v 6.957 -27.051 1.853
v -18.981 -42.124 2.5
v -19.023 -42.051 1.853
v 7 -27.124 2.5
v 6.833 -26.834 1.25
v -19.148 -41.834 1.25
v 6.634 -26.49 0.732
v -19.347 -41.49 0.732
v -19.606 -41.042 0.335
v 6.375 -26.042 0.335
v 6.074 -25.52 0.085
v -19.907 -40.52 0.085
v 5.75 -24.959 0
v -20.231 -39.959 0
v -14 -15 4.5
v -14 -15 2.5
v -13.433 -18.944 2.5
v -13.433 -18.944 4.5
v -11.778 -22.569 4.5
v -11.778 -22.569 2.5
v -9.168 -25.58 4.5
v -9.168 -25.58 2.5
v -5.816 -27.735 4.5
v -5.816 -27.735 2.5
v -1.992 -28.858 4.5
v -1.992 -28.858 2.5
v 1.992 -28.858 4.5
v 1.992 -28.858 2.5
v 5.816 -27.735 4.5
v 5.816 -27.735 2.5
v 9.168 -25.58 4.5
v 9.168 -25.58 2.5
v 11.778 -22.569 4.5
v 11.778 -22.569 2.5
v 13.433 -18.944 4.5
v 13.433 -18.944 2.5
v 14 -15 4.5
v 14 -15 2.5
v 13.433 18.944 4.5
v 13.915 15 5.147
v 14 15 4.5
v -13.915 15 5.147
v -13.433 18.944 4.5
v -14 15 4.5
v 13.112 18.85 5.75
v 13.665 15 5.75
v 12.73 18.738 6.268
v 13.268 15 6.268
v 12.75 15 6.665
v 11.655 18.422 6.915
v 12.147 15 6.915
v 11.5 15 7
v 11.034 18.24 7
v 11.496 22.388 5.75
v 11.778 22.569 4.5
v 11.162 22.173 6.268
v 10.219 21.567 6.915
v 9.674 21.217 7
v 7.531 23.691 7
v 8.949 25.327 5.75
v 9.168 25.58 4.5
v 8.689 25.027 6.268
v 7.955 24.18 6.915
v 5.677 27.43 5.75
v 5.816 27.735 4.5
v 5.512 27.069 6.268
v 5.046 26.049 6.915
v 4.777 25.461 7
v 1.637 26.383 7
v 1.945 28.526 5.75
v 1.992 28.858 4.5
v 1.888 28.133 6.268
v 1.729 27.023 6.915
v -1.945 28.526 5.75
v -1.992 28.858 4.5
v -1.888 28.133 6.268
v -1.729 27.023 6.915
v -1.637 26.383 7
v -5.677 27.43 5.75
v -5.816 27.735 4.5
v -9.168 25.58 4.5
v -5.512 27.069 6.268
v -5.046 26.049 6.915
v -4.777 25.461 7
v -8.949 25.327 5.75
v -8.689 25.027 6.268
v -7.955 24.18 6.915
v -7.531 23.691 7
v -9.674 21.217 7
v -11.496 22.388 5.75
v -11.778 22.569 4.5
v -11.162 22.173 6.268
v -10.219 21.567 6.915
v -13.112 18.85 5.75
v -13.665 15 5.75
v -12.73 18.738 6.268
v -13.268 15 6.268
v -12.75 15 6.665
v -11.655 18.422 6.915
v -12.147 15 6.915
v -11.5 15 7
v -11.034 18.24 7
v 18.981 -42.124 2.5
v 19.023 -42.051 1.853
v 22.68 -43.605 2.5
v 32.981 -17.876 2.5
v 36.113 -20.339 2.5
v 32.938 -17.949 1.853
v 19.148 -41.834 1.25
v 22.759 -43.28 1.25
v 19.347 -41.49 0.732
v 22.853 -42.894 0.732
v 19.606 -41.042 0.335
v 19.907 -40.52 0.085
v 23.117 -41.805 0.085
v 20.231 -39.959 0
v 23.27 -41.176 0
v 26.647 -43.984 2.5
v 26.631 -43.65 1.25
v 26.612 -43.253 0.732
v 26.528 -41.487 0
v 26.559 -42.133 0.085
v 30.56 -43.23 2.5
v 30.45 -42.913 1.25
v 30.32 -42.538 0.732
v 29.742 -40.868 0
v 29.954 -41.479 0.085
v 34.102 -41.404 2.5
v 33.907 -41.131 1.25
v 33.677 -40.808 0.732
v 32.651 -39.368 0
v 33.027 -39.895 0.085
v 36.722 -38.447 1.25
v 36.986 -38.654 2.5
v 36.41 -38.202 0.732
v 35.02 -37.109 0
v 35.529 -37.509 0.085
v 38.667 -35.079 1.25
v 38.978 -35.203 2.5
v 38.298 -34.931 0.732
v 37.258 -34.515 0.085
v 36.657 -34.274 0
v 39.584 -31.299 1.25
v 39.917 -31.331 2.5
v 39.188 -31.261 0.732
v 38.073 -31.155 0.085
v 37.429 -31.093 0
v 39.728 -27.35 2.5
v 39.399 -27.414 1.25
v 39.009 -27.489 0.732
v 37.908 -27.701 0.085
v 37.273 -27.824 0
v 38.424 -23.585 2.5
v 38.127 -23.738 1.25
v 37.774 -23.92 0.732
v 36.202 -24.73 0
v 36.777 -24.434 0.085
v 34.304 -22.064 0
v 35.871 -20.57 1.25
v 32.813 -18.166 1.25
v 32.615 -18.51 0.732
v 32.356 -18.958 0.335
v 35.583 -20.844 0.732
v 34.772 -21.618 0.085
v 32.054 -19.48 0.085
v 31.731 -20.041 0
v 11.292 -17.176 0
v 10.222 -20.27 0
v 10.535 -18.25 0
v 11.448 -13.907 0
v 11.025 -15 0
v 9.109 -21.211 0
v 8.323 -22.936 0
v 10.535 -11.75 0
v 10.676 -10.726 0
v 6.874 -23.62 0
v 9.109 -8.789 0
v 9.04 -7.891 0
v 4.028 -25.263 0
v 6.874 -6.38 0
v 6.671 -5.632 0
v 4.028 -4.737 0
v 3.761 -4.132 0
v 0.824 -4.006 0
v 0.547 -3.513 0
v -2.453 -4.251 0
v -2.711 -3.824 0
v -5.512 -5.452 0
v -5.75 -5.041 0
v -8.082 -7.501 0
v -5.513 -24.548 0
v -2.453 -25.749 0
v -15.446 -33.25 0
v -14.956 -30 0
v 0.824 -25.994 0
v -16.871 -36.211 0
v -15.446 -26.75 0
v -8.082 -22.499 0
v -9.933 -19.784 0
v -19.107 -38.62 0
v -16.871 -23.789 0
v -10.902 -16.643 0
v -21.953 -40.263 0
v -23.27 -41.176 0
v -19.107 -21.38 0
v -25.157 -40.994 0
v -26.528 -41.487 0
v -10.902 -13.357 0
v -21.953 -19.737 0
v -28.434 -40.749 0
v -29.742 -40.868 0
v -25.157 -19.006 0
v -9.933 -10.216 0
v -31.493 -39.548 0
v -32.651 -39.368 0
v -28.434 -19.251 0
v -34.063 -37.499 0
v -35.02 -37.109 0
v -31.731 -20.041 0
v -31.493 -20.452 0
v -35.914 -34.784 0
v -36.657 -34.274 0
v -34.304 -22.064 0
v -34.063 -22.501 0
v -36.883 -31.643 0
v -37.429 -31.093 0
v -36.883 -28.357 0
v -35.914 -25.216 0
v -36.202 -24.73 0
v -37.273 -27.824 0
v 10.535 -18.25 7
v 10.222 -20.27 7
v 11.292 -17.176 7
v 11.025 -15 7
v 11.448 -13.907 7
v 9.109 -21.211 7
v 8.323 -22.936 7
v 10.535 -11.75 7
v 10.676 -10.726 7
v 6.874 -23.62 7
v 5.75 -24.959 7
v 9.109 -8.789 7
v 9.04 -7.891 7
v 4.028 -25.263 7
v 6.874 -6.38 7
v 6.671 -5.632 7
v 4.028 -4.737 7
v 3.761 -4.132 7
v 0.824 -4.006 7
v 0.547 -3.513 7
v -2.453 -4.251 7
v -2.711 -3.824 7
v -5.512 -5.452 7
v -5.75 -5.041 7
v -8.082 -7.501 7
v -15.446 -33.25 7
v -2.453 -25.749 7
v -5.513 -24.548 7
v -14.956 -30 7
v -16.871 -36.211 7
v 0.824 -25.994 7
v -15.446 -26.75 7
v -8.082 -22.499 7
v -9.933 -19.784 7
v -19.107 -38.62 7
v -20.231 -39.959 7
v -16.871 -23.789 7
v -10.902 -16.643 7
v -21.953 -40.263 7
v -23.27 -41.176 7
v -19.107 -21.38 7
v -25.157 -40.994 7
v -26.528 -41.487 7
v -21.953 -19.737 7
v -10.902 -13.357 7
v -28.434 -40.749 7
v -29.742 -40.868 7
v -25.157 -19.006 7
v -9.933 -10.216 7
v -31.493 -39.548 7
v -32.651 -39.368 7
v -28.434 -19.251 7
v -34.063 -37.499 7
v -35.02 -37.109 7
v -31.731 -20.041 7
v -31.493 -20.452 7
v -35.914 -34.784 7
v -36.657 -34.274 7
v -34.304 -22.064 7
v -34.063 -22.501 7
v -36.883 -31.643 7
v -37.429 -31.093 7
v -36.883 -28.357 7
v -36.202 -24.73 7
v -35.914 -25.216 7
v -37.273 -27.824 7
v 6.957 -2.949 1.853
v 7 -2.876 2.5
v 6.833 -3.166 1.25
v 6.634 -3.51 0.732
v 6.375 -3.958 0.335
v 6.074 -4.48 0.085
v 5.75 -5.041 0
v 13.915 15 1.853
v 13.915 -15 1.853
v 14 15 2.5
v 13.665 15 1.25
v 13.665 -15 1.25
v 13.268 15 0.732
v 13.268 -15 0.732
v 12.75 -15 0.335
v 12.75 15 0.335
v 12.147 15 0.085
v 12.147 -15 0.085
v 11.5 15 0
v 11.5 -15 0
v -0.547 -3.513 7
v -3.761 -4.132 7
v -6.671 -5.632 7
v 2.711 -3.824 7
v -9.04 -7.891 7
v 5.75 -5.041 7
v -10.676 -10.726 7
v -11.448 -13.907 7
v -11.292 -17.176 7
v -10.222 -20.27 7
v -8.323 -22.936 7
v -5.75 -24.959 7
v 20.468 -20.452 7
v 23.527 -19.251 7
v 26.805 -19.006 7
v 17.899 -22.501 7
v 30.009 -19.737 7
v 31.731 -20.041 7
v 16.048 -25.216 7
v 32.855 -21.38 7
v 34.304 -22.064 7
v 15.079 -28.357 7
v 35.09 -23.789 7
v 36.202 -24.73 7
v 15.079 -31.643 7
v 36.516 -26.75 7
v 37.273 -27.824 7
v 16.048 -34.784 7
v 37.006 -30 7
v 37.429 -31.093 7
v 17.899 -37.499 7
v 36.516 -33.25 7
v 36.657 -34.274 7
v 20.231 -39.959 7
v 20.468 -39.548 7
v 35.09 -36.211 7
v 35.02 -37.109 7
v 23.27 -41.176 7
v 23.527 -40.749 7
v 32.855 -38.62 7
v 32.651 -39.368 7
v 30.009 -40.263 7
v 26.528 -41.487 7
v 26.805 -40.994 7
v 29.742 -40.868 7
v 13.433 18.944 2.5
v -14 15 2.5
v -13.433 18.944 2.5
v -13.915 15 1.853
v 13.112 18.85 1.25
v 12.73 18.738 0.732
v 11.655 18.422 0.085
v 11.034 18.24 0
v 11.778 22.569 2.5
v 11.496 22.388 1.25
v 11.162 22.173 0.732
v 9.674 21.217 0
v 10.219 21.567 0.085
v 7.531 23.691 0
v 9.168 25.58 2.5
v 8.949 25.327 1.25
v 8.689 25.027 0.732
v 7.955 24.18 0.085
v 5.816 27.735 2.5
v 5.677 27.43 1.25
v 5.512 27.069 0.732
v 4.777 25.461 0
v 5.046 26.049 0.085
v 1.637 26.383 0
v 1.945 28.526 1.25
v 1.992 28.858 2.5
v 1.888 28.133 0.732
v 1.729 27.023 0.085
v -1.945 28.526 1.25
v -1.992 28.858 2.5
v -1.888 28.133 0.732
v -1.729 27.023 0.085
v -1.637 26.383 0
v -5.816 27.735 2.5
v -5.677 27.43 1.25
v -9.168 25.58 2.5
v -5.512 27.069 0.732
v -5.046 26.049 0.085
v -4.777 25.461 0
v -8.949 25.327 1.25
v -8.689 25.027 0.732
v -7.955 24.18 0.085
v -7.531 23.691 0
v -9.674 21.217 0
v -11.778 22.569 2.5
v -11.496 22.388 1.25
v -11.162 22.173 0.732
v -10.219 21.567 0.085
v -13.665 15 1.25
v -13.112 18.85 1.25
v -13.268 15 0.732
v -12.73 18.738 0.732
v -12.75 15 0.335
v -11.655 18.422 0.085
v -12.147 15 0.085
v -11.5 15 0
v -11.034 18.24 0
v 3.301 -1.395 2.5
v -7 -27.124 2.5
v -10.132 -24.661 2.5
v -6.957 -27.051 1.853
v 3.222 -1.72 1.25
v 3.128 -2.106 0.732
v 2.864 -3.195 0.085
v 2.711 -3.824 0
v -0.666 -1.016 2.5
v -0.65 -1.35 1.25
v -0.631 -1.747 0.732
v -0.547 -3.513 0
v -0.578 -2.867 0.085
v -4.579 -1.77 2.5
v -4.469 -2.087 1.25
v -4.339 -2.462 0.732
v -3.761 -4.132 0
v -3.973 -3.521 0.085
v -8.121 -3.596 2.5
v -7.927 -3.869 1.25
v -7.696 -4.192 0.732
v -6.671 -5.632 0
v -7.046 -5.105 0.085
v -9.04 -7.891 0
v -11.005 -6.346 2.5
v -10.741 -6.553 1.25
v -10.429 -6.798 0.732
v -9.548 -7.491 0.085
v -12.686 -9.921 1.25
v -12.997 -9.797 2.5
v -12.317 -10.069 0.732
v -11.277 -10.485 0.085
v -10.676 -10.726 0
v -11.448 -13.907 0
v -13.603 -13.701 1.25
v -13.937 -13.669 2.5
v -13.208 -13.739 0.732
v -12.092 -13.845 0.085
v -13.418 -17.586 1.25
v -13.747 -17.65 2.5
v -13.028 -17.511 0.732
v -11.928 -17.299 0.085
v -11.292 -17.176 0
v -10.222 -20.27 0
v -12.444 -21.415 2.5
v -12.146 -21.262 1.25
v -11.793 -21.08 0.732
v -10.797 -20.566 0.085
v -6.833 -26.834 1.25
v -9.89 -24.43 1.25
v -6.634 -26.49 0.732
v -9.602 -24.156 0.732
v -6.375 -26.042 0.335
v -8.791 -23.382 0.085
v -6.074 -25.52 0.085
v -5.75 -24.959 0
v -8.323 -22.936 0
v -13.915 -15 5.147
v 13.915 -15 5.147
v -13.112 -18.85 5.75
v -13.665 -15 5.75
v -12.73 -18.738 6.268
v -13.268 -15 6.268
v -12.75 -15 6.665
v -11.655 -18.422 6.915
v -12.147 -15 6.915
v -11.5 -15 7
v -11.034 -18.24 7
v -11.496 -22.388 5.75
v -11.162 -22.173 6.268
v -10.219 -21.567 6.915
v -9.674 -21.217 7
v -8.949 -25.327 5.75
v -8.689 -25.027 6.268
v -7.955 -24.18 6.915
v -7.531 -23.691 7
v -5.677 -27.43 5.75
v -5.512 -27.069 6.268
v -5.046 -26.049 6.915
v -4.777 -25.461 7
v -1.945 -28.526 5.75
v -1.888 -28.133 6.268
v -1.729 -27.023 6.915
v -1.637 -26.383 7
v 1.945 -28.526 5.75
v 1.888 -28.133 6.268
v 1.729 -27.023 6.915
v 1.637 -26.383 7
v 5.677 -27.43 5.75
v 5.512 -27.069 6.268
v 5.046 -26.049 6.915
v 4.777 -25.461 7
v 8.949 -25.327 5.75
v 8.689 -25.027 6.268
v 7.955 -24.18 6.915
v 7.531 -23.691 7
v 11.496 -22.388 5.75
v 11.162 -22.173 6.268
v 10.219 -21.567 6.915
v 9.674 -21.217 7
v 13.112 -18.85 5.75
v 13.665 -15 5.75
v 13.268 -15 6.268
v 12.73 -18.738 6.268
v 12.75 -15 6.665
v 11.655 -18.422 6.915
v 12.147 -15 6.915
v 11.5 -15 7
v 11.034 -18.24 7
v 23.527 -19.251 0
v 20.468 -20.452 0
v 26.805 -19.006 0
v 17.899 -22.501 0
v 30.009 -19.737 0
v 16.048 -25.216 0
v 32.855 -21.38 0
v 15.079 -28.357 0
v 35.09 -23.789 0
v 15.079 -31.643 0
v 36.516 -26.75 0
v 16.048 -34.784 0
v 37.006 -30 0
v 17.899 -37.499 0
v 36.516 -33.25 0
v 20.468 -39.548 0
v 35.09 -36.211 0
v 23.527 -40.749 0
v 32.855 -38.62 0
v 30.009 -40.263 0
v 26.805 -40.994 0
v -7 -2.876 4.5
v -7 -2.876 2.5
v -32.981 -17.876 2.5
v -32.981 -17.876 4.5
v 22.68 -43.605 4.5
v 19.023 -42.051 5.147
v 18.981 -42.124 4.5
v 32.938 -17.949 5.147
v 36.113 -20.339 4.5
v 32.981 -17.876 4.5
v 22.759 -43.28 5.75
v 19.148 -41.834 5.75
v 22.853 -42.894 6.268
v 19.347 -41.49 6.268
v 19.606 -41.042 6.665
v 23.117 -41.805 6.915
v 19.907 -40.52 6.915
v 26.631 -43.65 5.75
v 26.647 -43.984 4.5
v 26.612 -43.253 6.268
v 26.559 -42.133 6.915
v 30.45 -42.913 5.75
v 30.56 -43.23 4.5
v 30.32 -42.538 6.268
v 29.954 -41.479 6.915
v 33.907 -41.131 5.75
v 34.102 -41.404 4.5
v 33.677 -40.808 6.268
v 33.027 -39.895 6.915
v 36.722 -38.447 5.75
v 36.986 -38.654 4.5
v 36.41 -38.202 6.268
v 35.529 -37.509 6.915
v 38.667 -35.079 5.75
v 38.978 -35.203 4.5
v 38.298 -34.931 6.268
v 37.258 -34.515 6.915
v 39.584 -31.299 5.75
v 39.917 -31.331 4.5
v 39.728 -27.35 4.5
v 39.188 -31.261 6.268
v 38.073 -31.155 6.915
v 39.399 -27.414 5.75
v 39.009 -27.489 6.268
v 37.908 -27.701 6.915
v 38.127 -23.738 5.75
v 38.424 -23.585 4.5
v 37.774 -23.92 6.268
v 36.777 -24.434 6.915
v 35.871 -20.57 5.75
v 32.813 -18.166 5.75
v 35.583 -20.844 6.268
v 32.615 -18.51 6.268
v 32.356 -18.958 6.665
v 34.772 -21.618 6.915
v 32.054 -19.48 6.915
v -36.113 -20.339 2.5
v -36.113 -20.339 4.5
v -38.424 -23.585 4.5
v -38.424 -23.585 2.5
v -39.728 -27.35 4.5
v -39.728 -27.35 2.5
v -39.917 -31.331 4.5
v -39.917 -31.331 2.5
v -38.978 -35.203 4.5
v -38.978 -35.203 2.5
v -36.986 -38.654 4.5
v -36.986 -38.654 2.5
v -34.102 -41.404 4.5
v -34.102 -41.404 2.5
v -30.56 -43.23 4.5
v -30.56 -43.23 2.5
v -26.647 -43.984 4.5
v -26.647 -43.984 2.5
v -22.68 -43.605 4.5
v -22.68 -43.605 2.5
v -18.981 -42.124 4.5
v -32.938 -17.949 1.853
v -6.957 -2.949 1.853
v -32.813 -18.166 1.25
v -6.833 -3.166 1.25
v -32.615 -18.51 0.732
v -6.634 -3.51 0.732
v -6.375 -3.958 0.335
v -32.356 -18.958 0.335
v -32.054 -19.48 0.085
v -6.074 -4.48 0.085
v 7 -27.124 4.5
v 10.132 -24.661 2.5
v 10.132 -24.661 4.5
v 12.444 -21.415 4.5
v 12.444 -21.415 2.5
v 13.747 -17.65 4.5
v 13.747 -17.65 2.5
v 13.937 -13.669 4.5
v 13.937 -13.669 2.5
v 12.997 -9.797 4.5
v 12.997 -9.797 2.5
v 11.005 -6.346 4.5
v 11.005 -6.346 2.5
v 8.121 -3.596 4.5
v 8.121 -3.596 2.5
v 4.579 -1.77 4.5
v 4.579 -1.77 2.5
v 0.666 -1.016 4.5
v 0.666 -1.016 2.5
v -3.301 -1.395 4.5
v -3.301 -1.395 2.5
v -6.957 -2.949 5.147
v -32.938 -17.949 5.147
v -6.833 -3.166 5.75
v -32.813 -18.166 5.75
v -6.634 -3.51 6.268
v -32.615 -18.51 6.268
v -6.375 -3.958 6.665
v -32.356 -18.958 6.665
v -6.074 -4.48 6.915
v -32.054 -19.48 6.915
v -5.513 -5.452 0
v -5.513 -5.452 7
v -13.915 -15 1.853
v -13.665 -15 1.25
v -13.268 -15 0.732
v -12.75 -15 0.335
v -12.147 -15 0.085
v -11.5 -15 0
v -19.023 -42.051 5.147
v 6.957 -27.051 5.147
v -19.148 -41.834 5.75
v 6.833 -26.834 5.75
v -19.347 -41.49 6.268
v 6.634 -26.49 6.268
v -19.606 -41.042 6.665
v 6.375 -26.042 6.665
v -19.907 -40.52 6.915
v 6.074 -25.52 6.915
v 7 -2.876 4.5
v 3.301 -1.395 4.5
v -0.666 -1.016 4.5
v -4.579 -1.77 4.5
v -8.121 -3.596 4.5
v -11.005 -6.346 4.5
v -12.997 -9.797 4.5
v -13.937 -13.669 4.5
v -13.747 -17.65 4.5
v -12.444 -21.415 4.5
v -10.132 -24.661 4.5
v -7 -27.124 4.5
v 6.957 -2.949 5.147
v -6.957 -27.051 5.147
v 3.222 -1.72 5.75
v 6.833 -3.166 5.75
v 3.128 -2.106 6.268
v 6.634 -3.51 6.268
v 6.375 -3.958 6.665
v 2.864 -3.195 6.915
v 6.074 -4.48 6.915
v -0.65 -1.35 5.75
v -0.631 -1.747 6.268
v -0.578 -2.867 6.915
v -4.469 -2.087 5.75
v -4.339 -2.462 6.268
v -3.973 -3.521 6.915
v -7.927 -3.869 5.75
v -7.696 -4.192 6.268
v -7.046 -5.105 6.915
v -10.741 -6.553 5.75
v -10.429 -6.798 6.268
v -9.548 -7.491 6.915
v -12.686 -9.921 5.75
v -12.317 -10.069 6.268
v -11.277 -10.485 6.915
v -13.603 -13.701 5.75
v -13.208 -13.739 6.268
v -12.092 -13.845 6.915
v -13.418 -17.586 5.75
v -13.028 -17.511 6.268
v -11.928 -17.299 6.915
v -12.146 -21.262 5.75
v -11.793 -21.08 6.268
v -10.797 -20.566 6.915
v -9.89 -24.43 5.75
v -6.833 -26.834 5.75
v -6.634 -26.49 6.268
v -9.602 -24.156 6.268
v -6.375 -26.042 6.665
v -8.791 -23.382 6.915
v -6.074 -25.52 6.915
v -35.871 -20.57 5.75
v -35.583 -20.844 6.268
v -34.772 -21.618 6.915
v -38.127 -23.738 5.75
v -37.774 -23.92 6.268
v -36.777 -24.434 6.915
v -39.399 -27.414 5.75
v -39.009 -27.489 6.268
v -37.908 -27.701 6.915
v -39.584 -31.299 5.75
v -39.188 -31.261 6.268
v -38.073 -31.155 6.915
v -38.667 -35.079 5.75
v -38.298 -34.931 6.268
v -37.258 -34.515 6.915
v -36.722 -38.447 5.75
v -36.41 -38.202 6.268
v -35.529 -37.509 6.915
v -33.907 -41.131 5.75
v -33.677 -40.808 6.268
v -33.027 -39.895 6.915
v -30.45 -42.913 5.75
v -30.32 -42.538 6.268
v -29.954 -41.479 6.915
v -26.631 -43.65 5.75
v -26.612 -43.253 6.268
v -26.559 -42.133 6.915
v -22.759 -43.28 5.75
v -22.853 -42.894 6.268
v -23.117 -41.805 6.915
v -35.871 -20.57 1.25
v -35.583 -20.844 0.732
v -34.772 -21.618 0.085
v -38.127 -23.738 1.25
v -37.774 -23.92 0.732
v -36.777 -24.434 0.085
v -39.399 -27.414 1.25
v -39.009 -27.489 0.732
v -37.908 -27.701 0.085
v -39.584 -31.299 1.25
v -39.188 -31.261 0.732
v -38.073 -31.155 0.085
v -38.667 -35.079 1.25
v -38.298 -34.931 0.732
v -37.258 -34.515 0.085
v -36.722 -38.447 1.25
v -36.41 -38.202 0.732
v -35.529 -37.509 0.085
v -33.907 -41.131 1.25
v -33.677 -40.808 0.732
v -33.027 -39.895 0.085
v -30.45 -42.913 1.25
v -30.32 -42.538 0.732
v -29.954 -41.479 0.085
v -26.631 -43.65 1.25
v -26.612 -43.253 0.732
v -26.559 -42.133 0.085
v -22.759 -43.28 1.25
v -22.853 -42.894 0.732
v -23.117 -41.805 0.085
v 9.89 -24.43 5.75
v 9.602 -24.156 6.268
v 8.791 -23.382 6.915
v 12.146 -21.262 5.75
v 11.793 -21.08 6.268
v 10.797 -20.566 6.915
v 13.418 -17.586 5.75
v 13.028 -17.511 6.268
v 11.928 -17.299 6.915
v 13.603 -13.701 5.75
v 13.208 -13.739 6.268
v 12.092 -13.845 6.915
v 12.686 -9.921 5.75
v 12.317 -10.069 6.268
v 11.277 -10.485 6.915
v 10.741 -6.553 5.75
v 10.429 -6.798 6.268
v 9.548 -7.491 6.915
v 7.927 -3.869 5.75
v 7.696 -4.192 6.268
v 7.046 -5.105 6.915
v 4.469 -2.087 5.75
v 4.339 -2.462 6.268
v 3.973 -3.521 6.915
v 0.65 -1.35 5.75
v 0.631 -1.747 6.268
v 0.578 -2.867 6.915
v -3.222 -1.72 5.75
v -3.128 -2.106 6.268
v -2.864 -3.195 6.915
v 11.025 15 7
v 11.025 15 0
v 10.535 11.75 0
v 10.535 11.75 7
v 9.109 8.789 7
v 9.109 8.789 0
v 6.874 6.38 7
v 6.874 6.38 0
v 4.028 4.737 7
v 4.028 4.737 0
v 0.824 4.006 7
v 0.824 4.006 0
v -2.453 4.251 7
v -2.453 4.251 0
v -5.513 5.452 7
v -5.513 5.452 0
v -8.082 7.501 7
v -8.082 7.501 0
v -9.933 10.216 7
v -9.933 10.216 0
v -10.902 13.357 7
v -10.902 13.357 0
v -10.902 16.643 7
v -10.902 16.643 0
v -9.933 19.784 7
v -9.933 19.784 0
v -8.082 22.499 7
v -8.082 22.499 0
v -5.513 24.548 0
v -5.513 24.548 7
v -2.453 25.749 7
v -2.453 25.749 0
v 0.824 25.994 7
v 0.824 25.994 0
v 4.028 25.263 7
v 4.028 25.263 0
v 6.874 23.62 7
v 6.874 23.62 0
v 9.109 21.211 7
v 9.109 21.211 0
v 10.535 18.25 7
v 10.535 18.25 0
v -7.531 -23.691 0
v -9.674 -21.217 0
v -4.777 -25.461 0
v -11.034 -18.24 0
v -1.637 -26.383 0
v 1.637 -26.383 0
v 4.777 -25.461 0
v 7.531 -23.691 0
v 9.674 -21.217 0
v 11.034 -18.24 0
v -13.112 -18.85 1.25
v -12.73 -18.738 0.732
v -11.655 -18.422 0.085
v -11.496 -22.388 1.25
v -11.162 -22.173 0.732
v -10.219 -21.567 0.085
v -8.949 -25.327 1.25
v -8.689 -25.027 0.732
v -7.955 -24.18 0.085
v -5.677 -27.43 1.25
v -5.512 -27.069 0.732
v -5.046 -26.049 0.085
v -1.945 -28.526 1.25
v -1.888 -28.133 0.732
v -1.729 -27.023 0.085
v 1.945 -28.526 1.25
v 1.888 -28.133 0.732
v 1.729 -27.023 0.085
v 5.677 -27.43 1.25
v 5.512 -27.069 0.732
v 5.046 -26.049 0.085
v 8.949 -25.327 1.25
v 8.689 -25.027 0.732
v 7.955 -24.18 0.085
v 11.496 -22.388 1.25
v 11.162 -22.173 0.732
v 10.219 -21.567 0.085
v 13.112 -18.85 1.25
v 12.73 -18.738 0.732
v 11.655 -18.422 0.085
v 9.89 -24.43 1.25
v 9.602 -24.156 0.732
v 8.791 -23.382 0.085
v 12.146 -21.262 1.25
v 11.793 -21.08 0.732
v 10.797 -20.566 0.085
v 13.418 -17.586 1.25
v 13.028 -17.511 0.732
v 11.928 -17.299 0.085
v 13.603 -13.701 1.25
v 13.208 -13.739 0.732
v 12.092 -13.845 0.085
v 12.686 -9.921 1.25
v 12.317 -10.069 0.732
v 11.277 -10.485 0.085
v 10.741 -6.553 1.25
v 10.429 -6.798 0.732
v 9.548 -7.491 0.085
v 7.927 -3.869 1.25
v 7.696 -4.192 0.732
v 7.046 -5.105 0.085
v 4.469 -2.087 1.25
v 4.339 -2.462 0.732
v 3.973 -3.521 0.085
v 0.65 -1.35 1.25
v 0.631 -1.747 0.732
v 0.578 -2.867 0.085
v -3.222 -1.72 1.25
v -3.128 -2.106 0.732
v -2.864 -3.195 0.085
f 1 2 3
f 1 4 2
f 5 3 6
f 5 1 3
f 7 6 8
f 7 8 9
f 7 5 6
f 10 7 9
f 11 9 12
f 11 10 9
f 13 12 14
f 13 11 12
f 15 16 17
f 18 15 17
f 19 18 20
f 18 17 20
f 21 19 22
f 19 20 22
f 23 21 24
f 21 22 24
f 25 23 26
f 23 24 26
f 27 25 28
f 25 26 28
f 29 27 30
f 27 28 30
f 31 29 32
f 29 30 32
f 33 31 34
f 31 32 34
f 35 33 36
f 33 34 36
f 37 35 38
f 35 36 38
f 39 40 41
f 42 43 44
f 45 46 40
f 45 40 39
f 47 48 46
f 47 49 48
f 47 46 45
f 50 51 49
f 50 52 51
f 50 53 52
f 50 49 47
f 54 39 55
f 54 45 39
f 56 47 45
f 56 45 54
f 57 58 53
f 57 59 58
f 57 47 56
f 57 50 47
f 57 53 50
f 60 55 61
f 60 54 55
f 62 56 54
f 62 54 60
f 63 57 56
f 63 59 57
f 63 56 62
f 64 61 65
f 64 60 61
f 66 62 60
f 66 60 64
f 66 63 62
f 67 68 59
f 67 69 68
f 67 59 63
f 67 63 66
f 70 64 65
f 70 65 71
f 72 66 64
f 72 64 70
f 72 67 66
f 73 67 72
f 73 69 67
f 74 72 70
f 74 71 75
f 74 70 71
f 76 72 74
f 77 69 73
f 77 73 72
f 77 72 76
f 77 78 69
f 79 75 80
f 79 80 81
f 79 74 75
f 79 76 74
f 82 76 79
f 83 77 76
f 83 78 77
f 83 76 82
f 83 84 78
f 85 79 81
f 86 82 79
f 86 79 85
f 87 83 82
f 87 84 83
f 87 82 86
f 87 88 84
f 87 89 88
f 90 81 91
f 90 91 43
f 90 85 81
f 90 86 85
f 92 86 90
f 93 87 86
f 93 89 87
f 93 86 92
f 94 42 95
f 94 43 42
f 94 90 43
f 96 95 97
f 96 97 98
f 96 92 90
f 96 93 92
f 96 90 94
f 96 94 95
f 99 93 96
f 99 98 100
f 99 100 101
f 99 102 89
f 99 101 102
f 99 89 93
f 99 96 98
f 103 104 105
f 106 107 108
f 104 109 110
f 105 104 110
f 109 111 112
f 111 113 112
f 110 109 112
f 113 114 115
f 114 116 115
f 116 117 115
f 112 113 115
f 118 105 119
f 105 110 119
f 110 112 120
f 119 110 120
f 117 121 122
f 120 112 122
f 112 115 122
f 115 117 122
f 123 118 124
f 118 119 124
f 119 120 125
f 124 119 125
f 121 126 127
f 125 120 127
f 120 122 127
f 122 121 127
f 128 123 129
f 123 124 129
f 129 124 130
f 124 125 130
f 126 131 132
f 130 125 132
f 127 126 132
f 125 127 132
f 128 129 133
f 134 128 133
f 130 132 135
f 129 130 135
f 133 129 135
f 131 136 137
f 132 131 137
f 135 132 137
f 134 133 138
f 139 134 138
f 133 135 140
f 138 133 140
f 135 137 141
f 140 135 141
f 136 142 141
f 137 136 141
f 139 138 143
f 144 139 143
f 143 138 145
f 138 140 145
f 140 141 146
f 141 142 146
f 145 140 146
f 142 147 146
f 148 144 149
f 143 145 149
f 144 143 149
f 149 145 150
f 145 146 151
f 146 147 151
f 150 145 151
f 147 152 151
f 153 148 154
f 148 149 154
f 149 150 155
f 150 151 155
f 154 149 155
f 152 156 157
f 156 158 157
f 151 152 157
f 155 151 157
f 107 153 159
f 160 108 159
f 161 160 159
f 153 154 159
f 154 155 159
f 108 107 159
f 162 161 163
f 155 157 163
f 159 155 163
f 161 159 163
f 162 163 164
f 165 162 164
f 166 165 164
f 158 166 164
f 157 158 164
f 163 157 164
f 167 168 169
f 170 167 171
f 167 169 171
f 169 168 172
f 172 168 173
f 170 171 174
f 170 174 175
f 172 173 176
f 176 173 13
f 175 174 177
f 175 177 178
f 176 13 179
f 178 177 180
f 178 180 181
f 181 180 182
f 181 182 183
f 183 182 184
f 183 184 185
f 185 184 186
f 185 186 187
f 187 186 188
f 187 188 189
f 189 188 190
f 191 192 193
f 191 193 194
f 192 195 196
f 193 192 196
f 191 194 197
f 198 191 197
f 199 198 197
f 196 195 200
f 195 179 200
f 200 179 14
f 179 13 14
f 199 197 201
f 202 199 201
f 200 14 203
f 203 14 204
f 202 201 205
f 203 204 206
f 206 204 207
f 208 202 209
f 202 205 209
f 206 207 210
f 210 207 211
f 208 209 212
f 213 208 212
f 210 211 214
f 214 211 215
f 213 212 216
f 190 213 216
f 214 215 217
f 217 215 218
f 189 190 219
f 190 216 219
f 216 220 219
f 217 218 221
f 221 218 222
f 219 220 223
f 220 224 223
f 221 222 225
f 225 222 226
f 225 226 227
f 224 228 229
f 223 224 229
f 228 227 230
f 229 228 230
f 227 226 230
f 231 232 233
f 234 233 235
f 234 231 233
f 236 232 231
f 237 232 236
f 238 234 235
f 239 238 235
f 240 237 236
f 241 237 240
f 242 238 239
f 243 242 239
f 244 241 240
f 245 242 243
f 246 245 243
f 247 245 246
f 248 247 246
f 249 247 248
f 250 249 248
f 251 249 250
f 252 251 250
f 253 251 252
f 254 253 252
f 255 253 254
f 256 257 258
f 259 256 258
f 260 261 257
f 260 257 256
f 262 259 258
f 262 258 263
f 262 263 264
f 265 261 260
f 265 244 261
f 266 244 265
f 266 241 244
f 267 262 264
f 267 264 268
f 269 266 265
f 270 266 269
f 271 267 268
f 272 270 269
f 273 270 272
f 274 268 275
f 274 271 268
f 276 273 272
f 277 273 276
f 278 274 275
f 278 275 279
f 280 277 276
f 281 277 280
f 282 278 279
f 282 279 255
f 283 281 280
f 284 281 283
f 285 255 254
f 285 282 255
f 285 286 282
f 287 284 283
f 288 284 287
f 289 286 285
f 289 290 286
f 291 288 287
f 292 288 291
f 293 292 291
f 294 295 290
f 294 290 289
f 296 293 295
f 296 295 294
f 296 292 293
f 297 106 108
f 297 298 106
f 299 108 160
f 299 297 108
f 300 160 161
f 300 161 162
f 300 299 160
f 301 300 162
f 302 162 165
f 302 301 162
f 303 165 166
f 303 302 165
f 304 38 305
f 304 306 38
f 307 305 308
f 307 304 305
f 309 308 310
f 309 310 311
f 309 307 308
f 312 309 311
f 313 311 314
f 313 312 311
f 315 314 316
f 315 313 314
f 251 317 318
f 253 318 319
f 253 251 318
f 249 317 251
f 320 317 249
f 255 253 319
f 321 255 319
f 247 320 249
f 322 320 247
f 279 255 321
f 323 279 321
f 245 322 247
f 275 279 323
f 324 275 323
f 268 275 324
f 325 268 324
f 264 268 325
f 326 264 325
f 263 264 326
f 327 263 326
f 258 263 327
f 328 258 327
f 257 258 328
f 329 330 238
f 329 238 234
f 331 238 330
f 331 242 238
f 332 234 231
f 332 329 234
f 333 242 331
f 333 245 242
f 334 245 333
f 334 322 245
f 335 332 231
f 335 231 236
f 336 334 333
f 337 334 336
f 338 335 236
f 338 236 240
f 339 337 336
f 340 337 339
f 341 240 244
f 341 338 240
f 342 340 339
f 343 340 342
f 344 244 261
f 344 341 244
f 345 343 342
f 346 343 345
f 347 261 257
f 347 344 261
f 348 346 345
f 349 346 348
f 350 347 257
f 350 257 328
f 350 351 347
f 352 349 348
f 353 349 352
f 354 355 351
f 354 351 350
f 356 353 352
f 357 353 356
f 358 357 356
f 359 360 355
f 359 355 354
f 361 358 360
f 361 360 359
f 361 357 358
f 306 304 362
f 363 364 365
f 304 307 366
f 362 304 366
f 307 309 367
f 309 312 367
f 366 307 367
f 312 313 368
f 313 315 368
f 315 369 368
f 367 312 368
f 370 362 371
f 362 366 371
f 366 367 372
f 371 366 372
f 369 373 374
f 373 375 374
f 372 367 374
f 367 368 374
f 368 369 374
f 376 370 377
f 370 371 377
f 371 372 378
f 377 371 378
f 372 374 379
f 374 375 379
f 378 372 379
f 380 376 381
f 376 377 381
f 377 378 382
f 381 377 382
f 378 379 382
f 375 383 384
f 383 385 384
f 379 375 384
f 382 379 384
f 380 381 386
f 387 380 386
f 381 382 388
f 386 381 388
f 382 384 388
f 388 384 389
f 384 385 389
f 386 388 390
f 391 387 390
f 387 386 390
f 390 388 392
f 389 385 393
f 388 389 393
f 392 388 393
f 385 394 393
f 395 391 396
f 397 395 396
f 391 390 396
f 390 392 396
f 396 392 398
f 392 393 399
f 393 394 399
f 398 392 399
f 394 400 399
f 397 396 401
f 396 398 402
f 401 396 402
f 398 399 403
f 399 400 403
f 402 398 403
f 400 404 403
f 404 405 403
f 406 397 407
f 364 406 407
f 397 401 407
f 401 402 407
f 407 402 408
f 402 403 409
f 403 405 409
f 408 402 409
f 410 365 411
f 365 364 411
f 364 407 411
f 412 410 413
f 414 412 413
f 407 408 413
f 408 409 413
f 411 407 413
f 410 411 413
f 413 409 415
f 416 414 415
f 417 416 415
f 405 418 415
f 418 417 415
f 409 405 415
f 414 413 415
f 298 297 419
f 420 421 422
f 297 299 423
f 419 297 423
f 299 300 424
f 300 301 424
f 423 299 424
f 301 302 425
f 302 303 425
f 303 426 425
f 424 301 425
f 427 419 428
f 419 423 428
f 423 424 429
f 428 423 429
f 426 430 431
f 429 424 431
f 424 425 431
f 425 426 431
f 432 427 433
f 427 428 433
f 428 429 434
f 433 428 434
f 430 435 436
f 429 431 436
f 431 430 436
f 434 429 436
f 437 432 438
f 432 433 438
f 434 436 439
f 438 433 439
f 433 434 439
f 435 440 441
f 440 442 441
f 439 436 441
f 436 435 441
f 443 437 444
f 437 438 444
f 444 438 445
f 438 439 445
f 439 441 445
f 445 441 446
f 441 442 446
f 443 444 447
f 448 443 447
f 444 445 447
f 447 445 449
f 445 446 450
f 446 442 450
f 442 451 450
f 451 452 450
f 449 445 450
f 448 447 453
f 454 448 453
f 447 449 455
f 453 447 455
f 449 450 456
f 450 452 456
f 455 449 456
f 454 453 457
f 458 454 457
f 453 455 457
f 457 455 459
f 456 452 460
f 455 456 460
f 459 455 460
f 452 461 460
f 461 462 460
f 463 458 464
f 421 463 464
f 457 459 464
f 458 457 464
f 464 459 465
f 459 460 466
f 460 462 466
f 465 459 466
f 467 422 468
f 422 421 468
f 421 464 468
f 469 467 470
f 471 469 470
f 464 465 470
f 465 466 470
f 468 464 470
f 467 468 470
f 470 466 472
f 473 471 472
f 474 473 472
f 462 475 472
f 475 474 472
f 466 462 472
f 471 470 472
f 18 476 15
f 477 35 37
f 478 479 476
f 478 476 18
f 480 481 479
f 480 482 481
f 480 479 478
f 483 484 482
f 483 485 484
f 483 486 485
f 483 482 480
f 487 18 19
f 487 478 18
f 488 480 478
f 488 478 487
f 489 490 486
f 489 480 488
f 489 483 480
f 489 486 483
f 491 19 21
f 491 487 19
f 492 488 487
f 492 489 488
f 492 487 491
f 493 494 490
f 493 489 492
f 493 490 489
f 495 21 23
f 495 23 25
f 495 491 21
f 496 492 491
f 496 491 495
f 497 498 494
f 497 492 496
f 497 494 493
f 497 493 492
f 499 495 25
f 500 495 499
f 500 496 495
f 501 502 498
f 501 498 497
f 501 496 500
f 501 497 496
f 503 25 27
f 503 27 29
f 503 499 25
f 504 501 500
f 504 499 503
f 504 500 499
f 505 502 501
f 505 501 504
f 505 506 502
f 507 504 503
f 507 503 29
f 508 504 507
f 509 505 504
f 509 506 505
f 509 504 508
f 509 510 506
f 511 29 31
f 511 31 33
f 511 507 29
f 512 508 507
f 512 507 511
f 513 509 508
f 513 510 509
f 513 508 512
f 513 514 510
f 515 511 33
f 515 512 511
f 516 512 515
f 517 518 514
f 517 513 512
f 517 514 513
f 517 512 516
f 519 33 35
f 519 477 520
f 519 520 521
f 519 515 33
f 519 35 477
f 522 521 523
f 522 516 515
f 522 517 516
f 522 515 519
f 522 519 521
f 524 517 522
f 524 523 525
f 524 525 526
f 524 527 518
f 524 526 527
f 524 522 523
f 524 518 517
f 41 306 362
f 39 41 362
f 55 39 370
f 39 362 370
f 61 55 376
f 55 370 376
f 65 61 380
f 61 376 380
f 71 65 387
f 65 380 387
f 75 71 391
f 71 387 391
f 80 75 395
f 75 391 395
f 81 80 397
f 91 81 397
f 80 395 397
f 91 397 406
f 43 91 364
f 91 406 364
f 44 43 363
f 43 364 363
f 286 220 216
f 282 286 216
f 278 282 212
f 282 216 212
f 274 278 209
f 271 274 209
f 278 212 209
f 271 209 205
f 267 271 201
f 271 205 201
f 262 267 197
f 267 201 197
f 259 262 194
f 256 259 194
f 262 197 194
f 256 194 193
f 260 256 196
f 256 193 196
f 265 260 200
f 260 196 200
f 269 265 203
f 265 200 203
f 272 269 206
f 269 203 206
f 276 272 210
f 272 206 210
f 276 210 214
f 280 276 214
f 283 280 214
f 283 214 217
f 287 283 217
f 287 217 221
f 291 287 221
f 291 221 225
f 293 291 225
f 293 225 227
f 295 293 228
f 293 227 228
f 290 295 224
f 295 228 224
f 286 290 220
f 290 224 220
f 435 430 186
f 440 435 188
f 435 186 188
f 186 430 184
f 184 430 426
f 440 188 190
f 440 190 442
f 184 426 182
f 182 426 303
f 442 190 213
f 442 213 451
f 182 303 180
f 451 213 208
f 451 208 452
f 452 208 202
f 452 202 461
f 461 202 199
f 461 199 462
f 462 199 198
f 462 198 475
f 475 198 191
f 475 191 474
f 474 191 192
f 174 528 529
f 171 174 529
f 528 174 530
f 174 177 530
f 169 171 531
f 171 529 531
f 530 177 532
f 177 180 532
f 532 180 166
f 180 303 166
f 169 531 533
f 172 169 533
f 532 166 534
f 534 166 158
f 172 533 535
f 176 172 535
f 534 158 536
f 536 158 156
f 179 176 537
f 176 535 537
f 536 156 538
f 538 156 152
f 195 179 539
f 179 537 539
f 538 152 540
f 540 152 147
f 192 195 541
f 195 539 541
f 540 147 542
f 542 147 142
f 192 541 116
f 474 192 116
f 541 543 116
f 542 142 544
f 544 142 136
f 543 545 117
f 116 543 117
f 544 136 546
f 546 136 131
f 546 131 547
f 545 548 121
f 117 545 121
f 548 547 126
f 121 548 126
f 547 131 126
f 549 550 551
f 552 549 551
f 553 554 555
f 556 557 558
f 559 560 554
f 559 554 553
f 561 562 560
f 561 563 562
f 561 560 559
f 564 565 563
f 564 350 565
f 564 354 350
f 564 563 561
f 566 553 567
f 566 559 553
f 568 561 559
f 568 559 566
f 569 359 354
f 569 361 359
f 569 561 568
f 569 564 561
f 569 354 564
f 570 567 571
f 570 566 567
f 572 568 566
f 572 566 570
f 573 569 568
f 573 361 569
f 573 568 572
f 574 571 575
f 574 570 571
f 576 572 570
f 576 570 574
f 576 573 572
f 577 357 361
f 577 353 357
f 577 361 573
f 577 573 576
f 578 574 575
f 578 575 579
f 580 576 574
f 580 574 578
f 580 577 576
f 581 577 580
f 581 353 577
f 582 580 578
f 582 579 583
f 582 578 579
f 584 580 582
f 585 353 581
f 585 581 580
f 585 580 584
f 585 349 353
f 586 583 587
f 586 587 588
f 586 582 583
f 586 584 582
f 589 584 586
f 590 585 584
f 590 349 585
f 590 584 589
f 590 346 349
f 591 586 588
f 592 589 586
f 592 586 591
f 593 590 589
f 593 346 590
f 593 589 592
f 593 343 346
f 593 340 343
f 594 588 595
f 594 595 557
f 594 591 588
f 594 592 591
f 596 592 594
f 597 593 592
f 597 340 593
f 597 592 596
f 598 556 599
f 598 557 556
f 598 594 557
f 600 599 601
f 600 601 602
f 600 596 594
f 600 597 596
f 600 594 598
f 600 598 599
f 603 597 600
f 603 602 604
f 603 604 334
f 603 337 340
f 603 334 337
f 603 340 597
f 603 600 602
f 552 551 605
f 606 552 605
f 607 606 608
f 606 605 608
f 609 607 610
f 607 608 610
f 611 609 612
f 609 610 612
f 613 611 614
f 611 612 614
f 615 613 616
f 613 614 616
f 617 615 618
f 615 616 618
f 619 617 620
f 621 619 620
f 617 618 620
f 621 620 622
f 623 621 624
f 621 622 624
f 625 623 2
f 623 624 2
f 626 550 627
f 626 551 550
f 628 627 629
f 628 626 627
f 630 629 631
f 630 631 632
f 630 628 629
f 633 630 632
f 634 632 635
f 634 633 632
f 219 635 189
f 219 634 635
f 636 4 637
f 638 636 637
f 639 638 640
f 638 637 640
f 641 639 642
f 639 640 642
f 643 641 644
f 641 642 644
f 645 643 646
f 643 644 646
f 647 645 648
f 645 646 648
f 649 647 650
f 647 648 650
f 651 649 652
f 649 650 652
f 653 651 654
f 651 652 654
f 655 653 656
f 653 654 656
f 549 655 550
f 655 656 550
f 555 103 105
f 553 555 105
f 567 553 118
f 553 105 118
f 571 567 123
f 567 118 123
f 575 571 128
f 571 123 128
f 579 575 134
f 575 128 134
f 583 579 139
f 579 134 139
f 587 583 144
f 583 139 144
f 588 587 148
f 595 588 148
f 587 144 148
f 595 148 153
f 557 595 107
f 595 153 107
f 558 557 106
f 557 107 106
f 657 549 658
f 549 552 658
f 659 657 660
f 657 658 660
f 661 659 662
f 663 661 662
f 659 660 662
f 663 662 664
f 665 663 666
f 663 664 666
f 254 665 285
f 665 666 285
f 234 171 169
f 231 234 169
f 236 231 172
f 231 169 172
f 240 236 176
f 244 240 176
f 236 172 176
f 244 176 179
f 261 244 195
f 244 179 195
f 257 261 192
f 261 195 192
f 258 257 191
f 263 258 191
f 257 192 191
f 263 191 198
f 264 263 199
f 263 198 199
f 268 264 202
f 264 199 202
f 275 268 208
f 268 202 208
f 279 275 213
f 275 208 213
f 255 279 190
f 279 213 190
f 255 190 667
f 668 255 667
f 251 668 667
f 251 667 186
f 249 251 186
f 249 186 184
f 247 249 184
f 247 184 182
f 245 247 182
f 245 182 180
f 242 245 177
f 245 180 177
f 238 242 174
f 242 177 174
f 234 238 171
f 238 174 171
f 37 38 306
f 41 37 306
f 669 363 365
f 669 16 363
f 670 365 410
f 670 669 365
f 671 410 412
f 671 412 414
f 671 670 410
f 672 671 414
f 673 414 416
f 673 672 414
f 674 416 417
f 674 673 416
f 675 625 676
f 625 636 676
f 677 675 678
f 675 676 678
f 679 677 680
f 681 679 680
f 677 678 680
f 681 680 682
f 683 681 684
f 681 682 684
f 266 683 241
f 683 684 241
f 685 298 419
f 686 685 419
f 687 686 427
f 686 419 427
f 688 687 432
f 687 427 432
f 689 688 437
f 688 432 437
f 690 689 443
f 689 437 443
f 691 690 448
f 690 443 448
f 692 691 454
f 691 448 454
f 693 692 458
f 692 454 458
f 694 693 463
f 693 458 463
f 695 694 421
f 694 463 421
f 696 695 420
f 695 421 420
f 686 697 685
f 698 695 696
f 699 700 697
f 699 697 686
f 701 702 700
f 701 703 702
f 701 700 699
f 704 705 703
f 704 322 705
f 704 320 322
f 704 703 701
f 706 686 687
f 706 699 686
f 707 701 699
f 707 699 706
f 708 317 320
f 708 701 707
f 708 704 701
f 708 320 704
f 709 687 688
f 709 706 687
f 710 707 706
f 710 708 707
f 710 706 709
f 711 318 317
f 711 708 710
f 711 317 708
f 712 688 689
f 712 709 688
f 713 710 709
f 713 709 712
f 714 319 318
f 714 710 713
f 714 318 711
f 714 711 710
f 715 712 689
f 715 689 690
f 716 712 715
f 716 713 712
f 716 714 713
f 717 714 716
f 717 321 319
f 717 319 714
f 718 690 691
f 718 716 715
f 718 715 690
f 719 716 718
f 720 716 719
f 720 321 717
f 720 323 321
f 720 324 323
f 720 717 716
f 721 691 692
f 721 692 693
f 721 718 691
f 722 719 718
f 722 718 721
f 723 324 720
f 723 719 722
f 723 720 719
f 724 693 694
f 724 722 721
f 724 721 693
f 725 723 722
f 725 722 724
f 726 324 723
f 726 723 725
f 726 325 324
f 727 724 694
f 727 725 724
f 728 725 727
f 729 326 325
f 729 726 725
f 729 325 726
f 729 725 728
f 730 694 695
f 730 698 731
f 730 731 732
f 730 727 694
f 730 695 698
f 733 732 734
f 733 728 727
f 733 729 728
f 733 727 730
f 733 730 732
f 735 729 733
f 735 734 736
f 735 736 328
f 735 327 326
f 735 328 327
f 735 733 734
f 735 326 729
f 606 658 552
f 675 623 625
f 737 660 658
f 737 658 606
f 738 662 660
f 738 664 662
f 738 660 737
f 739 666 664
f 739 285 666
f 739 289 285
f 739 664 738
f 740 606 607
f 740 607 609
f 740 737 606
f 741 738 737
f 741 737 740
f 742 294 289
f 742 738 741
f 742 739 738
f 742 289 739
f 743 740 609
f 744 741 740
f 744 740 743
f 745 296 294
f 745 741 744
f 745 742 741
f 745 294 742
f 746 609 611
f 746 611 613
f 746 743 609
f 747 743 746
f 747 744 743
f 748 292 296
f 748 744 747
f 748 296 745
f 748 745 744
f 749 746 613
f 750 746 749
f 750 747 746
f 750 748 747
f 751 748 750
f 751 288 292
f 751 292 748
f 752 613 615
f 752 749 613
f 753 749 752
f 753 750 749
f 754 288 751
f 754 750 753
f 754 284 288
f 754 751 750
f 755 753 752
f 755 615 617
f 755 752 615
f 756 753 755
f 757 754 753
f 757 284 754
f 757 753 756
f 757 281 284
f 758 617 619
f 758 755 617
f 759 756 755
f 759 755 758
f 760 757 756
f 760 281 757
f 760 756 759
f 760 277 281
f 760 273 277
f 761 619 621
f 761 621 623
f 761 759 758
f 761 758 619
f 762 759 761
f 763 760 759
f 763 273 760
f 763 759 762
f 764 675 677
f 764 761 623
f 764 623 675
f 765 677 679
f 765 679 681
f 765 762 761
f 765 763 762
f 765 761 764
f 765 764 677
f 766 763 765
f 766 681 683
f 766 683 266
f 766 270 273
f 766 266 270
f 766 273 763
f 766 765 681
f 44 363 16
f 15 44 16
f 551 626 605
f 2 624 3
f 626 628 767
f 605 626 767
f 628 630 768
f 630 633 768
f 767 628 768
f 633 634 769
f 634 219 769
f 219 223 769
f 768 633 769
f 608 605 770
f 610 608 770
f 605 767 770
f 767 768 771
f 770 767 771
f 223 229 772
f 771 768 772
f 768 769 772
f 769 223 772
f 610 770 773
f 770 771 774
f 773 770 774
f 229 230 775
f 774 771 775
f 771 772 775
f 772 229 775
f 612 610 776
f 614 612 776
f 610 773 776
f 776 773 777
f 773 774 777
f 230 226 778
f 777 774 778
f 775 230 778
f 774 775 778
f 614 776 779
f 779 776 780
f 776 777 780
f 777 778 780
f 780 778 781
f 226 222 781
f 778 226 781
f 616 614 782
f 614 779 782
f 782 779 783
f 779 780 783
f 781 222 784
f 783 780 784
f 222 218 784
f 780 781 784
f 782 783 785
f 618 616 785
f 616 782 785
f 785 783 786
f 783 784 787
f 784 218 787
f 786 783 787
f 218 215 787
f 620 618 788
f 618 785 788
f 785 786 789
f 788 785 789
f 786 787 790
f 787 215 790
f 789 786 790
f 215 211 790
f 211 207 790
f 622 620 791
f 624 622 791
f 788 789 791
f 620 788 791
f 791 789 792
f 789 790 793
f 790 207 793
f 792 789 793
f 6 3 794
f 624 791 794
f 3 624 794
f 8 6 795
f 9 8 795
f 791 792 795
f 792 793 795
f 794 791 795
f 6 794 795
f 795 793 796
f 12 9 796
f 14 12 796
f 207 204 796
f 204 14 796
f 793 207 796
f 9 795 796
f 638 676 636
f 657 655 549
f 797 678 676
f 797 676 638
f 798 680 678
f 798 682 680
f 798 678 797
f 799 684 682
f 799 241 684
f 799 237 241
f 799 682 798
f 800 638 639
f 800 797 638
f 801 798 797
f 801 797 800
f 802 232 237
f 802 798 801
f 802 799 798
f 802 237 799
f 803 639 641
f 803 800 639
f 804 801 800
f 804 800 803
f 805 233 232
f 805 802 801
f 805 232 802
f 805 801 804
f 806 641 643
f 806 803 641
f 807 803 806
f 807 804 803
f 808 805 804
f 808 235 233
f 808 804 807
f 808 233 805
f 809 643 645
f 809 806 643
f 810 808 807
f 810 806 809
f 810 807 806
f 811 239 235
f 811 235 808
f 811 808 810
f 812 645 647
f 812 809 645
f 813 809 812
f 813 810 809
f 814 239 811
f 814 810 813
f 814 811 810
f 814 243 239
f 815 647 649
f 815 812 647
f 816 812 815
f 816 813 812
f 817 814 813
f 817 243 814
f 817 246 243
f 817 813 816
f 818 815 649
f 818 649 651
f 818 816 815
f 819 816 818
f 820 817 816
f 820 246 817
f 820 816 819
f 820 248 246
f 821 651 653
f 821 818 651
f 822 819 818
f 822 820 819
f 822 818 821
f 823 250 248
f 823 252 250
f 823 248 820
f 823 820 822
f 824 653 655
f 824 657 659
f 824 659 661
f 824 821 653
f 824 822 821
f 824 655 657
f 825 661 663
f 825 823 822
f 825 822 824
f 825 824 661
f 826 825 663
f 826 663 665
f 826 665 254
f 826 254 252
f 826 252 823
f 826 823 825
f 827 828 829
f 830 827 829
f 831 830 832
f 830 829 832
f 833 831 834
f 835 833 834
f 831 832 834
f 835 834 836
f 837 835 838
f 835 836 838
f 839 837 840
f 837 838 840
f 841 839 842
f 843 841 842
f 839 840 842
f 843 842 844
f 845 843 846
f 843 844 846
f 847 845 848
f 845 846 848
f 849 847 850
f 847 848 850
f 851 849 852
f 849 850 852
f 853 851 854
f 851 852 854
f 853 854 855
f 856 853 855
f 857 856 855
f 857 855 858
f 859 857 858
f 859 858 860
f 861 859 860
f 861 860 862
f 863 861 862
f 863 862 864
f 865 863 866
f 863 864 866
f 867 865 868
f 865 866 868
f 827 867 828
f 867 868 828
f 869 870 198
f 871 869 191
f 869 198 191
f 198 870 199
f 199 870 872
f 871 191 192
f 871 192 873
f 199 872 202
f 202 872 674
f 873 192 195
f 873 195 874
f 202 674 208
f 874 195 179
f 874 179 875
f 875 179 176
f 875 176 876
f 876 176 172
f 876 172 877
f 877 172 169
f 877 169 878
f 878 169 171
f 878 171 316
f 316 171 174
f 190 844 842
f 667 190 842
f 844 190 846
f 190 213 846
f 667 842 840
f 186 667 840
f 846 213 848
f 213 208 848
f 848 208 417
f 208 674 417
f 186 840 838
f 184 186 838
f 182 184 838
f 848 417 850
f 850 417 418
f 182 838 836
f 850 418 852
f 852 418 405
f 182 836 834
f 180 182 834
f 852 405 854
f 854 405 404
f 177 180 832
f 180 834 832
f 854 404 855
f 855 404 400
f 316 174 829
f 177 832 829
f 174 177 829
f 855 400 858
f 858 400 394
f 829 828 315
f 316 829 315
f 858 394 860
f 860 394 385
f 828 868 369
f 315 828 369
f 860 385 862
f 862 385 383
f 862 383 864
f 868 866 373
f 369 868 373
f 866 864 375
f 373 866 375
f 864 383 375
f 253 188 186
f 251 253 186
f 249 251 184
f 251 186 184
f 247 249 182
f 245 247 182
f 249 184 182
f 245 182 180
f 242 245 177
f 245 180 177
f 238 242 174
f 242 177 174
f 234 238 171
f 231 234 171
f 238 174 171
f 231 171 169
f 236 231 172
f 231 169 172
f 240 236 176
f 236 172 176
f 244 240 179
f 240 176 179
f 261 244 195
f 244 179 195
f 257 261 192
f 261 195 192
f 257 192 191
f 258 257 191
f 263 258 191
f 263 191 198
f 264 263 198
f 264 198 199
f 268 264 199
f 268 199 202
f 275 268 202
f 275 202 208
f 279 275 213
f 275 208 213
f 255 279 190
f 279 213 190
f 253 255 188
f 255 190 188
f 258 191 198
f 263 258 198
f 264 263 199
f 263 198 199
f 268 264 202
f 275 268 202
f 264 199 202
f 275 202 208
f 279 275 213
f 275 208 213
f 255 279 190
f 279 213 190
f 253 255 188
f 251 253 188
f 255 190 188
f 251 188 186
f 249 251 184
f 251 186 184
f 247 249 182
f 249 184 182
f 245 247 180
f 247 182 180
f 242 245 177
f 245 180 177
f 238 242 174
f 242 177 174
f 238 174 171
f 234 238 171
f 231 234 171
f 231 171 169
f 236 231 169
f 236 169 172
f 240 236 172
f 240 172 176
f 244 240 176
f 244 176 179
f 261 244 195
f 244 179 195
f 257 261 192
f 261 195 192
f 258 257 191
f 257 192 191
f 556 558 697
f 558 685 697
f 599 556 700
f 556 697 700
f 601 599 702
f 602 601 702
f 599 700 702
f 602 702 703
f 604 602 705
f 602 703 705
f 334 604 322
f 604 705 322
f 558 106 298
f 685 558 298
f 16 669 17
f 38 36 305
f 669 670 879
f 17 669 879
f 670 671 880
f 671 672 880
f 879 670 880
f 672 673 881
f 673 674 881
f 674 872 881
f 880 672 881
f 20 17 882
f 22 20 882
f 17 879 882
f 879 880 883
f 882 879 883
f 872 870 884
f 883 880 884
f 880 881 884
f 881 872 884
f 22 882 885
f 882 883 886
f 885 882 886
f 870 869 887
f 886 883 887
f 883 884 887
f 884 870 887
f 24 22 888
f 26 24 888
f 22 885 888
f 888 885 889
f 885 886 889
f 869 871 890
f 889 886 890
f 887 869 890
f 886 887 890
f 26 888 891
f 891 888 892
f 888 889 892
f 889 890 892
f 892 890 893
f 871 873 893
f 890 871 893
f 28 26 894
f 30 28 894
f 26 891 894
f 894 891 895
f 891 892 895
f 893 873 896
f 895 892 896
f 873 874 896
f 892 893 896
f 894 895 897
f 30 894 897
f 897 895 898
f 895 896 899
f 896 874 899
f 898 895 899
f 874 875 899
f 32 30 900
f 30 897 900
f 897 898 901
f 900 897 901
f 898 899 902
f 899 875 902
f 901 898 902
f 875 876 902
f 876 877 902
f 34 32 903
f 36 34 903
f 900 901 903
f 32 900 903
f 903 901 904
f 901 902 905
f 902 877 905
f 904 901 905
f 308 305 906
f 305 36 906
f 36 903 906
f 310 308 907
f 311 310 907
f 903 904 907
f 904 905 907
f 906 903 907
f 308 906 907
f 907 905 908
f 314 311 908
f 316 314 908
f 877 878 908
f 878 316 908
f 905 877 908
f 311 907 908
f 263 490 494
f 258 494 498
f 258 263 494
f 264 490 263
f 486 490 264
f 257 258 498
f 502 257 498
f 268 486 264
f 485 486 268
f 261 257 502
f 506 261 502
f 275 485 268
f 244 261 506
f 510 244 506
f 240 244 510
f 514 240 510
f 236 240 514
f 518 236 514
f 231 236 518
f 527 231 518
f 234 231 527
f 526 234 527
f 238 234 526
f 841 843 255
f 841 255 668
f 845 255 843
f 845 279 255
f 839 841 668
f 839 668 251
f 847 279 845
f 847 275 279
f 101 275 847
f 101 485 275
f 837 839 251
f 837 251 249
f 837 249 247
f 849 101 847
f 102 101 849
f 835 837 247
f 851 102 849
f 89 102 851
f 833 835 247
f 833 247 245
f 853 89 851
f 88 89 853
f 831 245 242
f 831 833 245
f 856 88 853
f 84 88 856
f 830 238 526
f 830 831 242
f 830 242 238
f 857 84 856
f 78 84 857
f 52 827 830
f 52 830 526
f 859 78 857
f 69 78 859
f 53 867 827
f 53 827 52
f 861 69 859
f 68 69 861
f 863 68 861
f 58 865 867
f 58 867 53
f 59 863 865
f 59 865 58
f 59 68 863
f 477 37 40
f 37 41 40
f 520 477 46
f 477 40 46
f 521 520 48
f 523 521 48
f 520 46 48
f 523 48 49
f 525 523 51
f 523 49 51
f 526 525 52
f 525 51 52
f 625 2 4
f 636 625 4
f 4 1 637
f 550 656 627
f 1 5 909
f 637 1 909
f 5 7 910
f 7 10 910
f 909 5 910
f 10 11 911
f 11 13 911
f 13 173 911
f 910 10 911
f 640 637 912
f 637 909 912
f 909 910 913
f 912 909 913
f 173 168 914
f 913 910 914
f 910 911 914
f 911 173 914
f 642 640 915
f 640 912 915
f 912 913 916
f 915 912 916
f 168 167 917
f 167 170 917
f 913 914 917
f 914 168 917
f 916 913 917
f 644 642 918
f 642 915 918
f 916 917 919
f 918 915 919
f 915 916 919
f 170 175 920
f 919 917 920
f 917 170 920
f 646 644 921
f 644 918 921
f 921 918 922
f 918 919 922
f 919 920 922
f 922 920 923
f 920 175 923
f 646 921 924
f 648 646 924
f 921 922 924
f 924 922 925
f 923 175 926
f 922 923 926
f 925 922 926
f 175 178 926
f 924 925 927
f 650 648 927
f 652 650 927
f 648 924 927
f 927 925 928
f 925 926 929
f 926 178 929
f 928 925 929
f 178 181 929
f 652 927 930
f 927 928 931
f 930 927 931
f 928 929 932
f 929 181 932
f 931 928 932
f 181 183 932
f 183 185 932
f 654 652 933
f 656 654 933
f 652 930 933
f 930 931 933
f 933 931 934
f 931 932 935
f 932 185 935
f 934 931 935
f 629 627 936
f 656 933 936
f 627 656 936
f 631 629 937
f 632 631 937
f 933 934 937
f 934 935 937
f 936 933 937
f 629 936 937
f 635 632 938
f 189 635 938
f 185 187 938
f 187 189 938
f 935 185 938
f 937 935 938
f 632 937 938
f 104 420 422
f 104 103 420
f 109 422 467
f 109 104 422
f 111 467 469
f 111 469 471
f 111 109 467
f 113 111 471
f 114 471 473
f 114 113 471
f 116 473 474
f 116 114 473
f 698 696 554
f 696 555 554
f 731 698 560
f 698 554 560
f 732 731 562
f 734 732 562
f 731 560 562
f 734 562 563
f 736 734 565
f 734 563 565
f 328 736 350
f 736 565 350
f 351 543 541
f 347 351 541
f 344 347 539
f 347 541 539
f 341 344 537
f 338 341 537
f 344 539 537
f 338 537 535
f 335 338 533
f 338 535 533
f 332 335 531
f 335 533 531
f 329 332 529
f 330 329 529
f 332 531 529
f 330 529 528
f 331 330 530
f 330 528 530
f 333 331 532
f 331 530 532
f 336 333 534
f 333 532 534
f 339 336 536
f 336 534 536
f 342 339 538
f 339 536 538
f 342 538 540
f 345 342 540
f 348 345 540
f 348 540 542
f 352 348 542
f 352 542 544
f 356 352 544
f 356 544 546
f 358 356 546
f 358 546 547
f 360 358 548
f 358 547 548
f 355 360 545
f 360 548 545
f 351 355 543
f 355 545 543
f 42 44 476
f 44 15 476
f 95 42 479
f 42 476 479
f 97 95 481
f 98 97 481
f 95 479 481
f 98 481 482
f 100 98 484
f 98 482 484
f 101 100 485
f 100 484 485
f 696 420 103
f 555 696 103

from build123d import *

# Parameters (mm, degrees)
F1_DEPTH        = 7
F1_COPIES_COUNT = 3
F3_R            = 2.5
F3_2_R          = 2.5
F3_3_R          = 2.5


# Not quite as in the source:
# - a feature of the source that left no trace in its solid (it failed there, or was rolled back) is left out
# - a pattern or mirror of a feature is missing from the dataset's text; its kind, count and spacing are read off the source's solid


with BuildPart() as f1:
    # F0 (on Top) → F1 (new body)
    with BuildSketch(Plane.XY):
        with BuildLine():
            Line((11.025, 15), (14, 15))
            ThreePointArc((14, 15), (0, 29), (-14, 15))
            Line((-14, 15), (-11.025, 15))
            ThreePointArc((-11.025, 15), (0, 26.025), (11.025, 15))
        make_face()
        with BuildLine():
            ThreePointArc((-14, 15), (0, 1), (14, 15))
            Line((14, 15), (11.025, 15))
            ThreePointArc((11.025, 15), (0, 3.975), (-11.025, 15))
            Line((-11.025, 15), (-14, 15))
        make_face()
        with BuildLine():
            ThreePointArc((-14, -15), (0, -1), (14, -15))
            Line((14, -15), (14, 15))
            ThreePointArc((14, 15), (0, 1), (-14, 15))
            Line((-14, 15), (-14, -15))
        make_face()
        with BuildLine():
            Line((11.025, -15), (14, -15))
            ThreePointArc((14, -15), (0, -1), (-14, -15))
            Line((-14, -15), (-11.025, -15))
            ThreePointArc((-11.025, -15), (0, -3.975), (11.025, -15))
        make_face()
        with BuildLine():
            ThreePointArc((-14, -15), (0, -29), (14, -15))
            Line((14, -15), (11.025, -15))
            ThreePointArc((11.025, -15), (0, -26.025), (-11.025, -15))
            Line((-11.025, -15), (-14, -15))
        make_face()
    extrude(amount=F1_DEPTH)


with BuildPart() as f1_copies_1:
    # F1_copies: instance of F1
    add(f1.part.rotate(Axis((0, -15, 0), (0, 0, 1)), 1 * 360 / F1_COPIES_COUNT))

    # F3#2
    f3_2_edges = [f1_copies_1.edges().sort_by_distance(p)[0] for p in [
        (-38.105118, -37, 0),
        (-38.105118, -37, 7),
        (-5.990381, -34.624356, 0),
        (-5.990381, -34.624356, 7),
        (-19.990381, -10.375644, 0),
        (-19.990381, -10.375644, 7),
    ]]
    fillet(f3_2_edges, radius=F3_2_R)


with BuildPart() as f1_copies_2:
    # F1_copies: instance of F1
    add(f1.part.rotate(Axis((0, -15, 0), (0, 0, 1)), 2 * 360 / F1_COPIES_COUNT))

    # F3#3
    f3_3_edges = [f1_copies_2.edges().sort_by_distance(p)[0] for p in [
        (38.105118, -37, 0),
        (38.105118, -37, 7),
        (19.990381, -10.375644, 0),
        (19.990381, -10.375644, 7),
        (5.990381, -34.624356, 0),
        (5.990381, -34.624356, 7),
    ]]
    fillet(f3_3_edges, radius=F3_3_R)


with BuildPart() as f1_1:
    add(f1.part)

    # F3
    f3_edges = [f1_1.edges().sort_by_distance(p)[0] for p in [
        (-14, 0, 7),
        (0, 29, 7),
        (14, 0, 7),
        (-14, 0, 0),
        (0, 29, 0),
        (14, 0, 0),
    ]]
    fillet(f3_edges, radius=F3_R)


solid = Compound([f1_copies_1.part, f1_copies_2.part, f1_1.part])
